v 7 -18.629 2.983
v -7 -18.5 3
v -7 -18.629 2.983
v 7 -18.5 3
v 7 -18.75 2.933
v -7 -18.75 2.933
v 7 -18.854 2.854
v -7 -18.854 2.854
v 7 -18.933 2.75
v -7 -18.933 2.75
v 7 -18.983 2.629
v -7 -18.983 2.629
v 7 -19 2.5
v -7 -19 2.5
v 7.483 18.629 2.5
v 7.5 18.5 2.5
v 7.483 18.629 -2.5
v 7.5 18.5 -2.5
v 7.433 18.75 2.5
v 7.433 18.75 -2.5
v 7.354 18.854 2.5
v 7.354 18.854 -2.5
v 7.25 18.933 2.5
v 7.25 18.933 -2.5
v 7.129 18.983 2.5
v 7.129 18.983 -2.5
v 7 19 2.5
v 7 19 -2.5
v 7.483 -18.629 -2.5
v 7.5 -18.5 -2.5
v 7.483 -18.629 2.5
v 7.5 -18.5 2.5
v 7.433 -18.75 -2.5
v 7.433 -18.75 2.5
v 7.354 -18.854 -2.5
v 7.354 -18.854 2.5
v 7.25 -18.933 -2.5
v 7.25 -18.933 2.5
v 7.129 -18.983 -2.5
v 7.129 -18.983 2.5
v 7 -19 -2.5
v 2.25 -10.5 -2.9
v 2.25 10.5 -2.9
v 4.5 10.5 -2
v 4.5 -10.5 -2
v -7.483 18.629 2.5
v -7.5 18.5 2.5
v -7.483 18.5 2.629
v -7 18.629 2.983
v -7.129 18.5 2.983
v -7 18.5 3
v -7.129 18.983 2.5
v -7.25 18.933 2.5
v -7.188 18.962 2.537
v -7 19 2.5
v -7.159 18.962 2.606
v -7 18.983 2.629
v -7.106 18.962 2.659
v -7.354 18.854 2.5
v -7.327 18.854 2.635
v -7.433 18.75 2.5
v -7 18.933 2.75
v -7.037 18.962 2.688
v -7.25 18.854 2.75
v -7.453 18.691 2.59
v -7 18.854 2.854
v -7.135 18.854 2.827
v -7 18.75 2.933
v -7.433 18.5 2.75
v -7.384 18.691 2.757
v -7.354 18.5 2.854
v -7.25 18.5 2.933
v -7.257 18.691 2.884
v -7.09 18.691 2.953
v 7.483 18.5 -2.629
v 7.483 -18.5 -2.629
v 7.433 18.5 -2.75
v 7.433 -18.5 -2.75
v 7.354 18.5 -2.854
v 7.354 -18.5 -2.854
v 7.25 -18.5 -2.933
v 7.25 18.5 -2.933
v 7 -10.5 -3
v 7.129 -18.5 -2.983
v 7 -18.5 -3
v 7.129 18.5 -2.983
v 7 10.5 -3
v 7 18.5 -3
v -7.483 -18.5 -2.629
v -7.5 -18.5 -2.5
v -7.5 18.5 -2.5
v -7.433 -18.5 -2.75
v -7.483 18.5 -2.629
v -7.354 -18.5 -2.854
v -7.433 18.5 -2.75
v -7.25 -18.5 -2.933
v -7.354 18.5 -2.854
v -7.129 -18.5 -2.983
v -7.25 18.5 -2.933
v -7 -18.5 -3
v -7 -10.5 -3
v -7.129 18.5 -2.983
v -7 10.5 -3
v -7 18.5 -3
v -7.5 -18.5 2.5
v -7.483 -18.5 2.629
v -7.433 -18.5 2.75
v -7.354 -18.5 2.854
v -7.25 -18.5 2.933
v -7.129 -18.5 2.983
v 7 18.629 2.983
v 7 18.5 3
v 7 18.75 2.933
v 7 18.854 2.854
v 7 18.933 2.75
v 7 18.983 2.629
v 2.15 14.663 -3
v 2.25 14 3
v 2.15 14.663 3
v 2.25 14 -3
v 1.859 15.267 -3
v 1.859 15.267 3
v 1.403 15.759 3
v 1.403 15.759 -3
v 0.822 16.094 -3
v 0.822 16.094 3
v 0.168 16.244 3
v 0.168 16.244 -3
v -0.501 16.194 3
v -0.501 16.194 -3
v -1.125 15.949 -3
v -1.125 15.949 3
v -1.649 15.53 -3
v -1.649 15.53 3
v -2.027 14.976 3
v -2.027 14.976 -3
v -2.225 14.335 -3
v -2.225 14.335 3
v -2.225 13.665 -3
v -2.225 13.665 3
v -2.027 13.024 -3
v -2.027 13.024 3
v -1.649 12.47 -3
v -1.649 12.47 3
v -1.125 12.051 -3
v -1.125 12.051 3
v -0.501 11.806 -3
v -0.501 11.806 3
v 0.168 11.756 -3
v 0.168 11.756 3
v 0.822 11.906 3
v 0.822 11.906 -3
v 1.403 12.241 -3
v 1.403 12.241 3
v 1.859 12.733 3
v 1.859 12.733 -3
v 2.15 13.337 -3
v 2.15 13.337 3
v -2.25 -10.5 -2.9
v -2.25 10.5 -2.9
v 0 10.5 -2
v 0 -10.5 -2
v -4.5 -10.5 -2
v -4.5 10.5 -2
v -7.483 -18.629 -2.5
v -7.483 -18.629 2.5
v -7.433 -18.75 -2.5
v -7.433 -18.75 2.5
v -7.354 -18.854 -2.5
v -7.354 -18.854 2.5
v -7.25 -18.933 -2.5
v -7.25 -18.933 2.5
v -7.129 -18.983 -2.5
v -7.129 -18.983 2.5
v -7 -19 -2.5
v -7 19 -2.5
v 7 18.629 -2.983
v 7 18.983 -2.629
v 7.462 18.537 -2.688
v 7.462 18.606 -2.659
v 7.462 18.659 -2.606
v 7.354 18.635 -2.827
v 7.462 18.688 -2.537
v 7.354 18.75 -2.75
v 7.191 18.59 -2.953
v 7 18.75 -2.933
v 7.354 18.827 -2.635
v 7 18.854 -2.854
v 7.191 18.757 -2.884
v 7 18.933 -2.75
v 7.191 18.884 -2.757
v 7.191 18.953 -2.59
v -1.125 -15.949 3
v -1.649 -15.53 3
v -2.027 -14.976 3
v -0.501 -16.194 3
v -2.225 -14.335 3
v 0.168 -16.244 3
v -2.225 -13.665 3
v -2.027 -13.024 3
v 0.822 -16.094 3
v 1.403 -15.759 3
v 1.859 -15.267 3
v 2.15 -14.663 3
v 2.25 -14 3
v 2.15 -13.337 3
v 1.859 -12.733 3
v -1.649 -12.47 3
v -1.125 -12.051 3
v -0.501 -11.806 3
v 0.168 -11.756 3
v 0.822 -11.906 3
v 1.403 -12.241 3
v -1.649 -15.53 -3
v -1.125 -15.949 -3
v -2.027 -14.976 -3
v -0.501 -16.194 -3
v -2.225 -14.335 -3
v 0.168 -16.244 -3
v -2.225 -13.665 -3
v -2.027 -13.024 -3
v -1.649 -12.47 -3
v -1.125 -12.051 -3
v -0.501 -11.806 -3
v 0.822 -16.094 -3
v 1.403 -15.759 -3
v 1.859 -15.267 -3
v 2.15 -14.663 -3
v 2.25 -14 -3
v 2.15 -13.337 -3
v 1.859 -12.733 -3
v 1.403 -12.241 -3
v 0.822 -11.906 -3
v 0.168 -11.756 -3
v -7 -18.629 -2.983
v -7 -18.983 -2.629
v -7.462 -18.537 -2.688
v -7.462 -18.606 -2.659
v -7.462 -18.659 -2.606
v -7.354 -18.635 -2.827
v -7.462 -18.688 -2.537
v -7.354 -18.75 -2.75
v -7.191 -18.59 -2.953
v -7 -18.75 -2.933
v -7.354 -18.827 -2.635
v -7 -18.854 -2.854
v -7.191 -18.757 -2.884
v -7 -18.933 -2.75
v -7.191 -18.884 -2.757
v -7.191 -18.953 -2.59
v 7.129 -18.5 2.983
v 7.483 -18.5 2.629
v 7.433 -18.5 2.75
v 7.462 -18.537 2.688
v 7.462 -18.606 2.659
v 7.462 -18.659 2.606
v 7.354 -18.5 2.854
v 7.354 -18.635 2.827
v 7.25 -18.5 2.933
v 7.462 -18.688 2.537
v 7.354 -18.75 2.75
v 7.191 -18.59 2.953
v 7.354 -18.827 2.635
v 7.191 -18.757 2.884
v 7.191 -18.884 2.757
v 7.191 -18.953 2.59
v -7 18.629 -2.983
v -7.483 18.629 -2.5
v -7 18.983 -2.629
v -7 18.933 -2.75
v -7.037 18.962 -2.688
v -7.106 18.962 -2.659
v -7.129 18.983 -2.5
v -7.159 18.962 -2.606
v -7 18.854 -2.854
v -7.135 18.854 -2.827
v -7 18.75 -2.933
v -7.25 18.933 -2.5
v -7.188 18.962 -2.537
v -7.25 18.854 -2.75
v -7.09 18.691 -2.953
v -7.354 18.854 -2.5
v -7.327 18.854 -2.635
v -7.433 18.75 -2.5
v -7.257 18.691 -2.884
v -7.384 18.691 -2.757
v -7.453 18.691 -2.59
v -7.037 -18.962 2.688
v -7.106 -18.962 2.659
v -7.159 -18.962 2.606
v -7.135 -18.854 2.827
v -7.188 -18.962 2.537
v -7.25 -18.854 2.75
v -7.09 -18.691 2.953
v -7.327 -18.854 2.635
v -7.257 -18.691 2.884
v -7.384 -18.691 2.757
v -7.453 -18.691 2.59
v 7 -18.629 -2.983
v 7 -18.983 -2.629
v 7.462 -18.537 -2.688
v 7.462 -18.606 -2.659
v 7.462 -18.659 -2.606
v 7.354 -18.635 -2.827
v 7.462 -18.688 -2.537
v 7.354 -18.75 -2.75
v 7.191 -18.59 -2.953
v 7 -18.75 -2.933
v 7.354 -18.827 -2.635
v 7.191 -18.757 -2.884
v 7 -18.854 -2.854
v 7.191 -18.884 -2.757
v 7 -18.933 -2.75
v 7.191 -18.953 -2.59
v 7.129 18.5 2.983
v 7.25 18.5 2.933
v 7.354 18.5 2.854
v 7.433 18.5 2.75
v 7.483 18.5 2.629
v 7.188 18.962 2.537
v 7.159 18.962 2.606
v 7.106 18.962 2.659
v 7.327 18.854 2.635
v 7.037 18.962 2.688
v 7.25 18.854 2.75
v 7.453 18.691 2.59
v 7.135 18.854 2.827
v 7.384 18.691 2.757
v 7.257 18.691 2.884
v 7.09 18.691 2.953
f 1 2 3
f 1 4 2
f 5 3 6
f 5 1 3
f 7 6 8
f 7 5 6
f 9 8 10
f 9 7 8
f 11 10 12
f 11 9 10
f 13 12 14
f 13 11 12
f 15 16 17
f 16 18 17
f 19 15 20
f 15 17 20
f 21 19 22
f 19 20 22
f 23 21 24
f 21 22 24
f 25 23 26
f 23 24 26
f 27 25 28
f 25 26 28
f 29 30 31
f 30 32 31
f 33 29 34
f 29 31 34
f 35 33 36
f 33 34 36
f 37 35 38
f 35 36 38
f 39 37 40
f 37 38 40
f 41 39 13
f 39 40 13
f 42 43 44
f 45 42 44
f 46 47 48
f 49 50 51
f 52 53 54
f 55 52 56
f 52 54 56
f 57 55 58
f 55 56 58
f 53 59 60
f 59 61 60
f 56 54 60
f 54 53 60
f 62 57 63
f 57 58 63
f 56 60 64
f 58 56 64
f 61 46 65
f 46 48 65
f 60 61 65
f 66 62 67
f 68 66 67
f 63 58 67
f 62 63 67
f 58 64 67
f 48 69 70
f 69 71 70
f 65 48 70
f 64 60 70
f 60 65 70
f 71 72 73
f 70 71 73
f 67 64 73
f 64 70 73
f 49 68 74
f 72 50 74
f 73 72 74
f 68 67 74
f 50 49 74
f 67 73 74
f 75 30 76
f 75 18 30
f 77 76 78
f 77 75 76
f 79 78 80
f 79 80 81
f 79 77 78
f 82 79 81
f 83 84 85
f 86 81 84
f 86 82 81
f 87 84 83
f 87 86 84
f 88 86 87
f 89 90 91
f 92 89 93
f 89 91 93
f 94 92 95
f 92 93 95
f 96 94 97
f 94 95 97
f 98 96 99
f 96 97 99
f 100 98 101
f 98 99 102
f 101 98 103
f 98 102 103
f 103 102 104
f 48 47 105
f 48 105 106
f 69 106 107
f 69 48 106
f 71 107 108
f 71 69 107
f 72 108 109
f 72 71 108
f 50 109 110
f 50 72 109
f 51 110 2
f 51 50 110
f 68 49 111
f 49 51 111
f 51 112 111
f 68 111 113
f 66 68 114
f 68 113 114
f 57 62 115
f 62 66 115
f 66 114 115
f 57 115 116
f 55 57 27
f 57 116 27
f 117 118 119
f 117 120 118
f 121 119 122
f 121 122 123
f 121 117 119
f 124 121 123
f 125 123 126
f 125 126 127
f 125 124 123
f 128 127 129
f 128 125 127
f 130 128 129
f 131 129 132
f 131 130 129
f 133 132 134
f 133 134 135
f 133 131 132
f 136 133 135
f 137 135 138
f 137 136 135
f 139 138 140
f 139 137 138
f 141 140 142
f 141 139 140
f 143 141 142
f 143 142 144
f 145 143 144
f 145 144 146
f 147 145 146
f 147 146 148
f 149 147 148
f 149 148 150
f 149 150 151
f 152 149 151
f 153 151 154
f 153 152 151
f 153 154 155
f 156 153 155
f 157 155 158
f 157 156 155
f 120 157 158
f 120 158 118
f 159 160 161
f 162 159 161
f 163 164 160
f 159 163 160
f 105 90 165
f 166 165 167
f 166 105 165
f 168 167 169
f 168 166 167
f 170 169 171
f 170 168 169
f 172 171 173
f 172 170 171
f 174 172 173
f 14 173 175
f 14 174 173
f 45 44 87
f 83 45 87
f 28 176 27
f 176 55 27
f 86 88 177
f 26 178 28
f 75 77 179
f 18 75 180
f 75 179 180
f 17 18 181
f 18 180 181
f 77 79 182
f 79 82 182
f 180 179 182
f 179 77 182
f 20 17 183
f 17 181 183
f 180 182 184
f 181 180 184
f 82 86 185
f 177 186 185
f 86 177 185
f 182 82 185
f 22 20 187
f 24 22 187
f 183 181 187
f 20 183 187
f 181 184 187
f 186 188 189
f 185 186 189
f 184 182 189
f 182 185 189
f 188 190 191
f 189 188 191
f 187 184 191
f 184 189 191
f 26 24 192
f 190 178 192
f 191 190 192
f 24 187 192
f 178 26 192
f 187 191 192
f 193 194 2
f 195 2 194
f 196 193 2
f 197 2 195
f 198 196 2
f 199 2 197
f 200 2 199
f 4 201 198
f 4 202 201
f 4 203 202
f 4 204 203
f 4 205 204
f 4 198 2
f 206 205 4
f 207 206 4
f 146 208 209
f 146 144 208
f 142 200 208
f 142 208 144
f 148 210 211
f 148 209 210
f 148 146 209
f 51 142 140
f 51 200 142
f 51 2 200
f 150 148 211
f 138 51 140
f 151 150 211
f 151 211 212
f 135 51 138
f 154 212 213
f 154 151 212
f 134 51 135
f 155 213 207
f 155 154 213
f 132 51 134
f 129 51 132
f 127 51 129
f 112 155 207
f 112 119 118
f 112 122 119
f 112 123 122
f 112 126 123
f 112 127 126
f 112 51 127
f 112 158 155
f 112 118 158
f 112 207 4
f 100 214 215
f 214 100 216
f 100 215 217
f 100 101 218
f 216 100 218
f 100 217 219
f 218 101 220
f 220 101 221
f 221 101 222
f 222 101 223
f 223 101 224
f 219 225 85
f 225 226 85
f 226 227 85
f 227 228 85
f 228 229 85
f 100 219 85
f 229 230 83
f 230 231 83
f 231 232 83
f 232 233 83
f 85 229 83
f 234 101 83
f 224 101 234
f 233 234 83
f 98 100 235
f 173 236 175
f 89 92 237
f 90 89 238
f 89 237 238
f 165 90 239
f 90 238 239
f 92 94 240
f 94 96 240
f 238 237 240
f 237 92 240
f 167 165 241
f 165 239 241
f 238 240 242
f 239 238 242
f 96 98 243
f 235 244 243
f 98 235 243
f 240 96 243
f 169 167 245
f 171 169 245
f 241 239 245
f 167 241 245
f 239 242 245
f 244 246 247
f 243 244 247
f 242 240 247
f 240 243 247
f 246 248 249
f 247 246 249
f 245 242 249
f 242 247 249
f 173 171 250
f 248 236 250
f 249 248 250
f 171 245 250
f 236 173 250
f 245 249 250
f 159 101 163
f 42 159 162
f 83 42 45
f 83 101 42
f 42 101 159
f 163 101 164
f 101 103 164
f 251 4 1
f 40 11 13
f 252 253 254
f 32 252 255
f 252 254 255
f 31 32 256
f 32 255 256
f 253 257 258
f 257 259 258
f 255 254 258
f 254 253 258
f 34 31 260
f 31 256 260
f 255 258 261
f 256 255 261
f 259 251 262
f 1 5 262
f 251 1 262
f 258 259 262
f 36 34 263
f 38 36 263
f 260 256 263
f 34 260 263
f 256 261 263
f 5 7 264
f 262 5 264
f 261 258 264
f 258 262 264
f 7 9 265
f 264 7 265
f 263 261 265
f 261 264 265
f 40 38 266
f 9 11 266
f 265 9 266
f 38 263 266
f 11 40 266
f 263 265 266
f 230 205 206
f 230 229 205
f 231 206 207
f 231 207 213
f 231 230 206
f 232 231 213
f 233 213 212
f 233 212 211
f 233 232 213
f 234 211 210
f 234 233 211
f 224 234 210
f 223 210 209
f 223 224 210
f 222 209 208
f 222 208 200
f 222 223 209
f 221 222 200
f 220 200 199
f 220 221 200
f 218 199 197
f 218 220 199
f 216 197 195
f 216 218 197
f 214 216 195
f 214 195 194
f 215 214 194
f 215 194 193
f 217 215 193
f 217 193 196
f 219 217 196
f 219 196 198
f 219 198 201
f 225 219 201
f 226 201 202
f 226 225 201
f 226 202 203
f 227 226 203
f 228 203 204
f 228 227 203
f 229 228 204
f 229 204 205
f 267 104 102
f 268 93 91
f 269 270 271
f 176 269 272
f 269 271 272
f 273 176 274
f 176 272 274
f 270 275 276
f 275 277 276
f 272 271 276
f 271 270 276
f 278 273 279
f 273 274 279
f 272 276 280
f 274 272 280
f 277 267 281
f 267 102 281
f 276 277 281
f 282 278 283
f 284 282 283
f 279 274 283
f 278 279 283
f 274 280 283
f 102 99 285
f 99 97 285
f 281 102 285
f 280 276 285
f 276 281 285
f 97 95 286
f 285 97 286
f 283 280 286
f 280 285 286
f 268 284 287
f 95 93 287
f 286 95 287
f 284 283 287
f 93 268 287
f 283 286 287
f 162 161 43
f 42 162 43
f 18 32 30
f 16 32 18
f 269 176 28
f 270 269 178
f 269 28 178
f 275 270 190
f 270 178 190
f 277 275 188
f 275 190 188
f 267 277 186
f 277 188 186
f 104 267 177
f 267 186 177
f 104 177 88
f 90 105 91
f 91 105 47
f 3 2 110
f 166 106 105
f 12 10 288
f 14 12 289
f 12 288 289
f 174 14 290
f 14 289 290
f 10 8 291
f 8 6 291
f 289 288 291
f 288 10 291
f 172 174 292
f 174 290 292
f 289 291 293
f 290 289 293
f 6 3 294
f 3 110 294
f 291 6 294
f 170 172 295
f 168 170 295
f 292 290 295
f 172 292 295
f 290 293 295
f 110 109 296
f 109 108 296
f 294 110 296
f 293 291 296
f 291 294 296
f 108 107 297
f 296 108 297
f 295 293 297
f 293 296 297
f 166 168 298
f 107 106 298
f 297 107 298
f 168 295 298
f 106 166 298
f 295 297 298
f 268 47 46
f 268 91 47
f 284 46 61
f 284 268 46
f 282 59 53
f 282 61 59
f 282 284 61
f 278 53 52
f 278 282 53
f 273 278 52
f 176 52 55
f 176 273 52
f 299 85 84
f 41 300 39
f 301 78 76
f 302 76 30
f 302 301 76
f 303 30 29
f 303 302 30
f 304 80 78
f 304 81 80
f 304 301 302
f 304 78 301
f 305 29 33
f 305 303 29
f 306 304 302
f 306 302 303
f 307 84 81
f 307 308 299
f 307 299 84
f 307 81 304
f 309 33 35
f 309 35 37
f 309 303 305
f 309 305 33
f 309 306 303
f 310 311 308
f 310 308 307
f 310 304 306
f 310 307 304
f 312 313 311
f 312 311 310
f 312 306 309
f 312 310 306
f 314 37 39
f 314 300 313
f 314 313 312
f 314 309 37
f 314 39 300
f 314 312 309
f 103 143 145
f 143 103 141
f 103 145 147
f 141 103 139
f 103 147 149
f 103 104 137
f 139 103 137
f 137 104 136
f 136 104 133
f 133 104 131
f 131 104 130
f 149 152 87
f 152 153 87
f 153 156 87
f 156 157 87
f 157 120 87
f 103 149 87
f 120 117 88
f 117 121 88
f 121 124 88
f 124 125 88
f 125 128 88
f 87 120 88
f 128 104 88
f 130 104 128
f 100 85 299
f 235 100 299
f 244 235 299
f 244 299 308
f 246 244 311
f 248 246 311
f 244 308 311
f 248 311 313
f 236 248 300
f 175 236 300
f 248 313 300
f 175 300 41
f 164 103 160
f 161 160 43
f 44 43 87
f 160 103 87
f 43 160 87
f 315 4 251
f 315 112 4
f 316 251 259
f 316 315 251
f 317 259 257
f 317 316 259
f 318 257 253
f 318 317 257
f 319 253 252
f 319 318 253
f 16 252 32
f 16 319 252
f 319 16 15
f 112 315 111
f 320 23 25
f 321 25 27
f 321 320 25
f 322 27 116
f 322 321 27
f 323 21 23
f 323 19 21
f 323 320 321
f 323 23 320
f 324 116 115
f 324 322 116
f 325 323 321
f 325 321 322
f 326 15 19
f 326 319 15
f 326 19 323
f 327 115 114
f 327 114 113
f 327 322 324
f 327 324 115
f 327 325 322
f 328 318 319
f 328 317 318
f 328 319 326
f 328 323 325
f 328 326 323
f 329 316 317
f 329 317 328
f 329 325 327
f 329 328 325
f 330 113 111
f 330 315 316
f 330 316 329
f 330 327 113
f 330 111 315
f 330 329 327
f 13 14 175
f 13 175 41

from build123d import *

# Parameters (mm, degrees)
SKETCH_1_W             = 15
SKETCH_1_H             = 38
SKETCH_1_R             = 2.25
EXTRUDE_1_DEPTH        = 3
FILLET_1_R             = 0.5
CUT_EXTRUDE_1_DEPTH    = 10.5
PATTERN_LINEAR_1_COUNT = 3
PATTERN_LINEAR_1_PITCH = 4.5


with BuildPart() as part:
    # 草图1 → 凸台-拉伸1 (new, symmetric)
    with BuildSketch(Plane.XY):
        Rectangle(SKETCH_1_W, SKETCH_1_H)
        with Locations((0, 14)):
            Circle(SKETCH_1_R, mode=Mode.SUBTRACT)
        with Locations((0, -14)):
            Circle(SKETCH_1_R, mode=Mode.SUBTRACT)
    extrude(amount=EXTRUDE_1_DEPTH, both=True)

    # 圆角1
    fillet_1_edges = [part.edges().sort_by_distance(p)[0] for p in [
        (-7.5, 0, 3),
        (0, -19, 3),
        (7.5, 0, 3),
        (0, -19, -3),
        (-7.5, 0, -3),
        (0, 19, -3),
        (7.5, 0, -3),
        (7.5, -19, 0),
        (-7.5, -19, 0),
        (-7.5, 19, 0),
        (7.5, 19, 0),
        (0, 19, 3),
    ]]
    fillet(fillet_1_edges, radius=FILLET_1_R)

    # 草图2 → 切除-拉伸1 (cut, symmetric)
    with BuildSketch(Plane(origin=(0, 0, 0), x_dir=(1, 0, 0), z_dir=(0, 1, 0))):
        Polygon((-7, 3), (-4.5, 2), (-2, 3), align=None)
    cut_extrude_1 = extrude(amount=CUT_EXTRUDE_1_DEPTH, both=True, mode=Mode.SUBTRACT)

    # 阵列(线性)1: 切除-拉伸1 ×3
    with Locations(*[(i * PATTERN_LINEAR_1_PITCH, 0, 0) for i in range(1, PATTERN_LINEAR_1_COUNT)]):
        add(cut_extrude_1, mode=Mode.SUBTRACT)


solid = part.part
